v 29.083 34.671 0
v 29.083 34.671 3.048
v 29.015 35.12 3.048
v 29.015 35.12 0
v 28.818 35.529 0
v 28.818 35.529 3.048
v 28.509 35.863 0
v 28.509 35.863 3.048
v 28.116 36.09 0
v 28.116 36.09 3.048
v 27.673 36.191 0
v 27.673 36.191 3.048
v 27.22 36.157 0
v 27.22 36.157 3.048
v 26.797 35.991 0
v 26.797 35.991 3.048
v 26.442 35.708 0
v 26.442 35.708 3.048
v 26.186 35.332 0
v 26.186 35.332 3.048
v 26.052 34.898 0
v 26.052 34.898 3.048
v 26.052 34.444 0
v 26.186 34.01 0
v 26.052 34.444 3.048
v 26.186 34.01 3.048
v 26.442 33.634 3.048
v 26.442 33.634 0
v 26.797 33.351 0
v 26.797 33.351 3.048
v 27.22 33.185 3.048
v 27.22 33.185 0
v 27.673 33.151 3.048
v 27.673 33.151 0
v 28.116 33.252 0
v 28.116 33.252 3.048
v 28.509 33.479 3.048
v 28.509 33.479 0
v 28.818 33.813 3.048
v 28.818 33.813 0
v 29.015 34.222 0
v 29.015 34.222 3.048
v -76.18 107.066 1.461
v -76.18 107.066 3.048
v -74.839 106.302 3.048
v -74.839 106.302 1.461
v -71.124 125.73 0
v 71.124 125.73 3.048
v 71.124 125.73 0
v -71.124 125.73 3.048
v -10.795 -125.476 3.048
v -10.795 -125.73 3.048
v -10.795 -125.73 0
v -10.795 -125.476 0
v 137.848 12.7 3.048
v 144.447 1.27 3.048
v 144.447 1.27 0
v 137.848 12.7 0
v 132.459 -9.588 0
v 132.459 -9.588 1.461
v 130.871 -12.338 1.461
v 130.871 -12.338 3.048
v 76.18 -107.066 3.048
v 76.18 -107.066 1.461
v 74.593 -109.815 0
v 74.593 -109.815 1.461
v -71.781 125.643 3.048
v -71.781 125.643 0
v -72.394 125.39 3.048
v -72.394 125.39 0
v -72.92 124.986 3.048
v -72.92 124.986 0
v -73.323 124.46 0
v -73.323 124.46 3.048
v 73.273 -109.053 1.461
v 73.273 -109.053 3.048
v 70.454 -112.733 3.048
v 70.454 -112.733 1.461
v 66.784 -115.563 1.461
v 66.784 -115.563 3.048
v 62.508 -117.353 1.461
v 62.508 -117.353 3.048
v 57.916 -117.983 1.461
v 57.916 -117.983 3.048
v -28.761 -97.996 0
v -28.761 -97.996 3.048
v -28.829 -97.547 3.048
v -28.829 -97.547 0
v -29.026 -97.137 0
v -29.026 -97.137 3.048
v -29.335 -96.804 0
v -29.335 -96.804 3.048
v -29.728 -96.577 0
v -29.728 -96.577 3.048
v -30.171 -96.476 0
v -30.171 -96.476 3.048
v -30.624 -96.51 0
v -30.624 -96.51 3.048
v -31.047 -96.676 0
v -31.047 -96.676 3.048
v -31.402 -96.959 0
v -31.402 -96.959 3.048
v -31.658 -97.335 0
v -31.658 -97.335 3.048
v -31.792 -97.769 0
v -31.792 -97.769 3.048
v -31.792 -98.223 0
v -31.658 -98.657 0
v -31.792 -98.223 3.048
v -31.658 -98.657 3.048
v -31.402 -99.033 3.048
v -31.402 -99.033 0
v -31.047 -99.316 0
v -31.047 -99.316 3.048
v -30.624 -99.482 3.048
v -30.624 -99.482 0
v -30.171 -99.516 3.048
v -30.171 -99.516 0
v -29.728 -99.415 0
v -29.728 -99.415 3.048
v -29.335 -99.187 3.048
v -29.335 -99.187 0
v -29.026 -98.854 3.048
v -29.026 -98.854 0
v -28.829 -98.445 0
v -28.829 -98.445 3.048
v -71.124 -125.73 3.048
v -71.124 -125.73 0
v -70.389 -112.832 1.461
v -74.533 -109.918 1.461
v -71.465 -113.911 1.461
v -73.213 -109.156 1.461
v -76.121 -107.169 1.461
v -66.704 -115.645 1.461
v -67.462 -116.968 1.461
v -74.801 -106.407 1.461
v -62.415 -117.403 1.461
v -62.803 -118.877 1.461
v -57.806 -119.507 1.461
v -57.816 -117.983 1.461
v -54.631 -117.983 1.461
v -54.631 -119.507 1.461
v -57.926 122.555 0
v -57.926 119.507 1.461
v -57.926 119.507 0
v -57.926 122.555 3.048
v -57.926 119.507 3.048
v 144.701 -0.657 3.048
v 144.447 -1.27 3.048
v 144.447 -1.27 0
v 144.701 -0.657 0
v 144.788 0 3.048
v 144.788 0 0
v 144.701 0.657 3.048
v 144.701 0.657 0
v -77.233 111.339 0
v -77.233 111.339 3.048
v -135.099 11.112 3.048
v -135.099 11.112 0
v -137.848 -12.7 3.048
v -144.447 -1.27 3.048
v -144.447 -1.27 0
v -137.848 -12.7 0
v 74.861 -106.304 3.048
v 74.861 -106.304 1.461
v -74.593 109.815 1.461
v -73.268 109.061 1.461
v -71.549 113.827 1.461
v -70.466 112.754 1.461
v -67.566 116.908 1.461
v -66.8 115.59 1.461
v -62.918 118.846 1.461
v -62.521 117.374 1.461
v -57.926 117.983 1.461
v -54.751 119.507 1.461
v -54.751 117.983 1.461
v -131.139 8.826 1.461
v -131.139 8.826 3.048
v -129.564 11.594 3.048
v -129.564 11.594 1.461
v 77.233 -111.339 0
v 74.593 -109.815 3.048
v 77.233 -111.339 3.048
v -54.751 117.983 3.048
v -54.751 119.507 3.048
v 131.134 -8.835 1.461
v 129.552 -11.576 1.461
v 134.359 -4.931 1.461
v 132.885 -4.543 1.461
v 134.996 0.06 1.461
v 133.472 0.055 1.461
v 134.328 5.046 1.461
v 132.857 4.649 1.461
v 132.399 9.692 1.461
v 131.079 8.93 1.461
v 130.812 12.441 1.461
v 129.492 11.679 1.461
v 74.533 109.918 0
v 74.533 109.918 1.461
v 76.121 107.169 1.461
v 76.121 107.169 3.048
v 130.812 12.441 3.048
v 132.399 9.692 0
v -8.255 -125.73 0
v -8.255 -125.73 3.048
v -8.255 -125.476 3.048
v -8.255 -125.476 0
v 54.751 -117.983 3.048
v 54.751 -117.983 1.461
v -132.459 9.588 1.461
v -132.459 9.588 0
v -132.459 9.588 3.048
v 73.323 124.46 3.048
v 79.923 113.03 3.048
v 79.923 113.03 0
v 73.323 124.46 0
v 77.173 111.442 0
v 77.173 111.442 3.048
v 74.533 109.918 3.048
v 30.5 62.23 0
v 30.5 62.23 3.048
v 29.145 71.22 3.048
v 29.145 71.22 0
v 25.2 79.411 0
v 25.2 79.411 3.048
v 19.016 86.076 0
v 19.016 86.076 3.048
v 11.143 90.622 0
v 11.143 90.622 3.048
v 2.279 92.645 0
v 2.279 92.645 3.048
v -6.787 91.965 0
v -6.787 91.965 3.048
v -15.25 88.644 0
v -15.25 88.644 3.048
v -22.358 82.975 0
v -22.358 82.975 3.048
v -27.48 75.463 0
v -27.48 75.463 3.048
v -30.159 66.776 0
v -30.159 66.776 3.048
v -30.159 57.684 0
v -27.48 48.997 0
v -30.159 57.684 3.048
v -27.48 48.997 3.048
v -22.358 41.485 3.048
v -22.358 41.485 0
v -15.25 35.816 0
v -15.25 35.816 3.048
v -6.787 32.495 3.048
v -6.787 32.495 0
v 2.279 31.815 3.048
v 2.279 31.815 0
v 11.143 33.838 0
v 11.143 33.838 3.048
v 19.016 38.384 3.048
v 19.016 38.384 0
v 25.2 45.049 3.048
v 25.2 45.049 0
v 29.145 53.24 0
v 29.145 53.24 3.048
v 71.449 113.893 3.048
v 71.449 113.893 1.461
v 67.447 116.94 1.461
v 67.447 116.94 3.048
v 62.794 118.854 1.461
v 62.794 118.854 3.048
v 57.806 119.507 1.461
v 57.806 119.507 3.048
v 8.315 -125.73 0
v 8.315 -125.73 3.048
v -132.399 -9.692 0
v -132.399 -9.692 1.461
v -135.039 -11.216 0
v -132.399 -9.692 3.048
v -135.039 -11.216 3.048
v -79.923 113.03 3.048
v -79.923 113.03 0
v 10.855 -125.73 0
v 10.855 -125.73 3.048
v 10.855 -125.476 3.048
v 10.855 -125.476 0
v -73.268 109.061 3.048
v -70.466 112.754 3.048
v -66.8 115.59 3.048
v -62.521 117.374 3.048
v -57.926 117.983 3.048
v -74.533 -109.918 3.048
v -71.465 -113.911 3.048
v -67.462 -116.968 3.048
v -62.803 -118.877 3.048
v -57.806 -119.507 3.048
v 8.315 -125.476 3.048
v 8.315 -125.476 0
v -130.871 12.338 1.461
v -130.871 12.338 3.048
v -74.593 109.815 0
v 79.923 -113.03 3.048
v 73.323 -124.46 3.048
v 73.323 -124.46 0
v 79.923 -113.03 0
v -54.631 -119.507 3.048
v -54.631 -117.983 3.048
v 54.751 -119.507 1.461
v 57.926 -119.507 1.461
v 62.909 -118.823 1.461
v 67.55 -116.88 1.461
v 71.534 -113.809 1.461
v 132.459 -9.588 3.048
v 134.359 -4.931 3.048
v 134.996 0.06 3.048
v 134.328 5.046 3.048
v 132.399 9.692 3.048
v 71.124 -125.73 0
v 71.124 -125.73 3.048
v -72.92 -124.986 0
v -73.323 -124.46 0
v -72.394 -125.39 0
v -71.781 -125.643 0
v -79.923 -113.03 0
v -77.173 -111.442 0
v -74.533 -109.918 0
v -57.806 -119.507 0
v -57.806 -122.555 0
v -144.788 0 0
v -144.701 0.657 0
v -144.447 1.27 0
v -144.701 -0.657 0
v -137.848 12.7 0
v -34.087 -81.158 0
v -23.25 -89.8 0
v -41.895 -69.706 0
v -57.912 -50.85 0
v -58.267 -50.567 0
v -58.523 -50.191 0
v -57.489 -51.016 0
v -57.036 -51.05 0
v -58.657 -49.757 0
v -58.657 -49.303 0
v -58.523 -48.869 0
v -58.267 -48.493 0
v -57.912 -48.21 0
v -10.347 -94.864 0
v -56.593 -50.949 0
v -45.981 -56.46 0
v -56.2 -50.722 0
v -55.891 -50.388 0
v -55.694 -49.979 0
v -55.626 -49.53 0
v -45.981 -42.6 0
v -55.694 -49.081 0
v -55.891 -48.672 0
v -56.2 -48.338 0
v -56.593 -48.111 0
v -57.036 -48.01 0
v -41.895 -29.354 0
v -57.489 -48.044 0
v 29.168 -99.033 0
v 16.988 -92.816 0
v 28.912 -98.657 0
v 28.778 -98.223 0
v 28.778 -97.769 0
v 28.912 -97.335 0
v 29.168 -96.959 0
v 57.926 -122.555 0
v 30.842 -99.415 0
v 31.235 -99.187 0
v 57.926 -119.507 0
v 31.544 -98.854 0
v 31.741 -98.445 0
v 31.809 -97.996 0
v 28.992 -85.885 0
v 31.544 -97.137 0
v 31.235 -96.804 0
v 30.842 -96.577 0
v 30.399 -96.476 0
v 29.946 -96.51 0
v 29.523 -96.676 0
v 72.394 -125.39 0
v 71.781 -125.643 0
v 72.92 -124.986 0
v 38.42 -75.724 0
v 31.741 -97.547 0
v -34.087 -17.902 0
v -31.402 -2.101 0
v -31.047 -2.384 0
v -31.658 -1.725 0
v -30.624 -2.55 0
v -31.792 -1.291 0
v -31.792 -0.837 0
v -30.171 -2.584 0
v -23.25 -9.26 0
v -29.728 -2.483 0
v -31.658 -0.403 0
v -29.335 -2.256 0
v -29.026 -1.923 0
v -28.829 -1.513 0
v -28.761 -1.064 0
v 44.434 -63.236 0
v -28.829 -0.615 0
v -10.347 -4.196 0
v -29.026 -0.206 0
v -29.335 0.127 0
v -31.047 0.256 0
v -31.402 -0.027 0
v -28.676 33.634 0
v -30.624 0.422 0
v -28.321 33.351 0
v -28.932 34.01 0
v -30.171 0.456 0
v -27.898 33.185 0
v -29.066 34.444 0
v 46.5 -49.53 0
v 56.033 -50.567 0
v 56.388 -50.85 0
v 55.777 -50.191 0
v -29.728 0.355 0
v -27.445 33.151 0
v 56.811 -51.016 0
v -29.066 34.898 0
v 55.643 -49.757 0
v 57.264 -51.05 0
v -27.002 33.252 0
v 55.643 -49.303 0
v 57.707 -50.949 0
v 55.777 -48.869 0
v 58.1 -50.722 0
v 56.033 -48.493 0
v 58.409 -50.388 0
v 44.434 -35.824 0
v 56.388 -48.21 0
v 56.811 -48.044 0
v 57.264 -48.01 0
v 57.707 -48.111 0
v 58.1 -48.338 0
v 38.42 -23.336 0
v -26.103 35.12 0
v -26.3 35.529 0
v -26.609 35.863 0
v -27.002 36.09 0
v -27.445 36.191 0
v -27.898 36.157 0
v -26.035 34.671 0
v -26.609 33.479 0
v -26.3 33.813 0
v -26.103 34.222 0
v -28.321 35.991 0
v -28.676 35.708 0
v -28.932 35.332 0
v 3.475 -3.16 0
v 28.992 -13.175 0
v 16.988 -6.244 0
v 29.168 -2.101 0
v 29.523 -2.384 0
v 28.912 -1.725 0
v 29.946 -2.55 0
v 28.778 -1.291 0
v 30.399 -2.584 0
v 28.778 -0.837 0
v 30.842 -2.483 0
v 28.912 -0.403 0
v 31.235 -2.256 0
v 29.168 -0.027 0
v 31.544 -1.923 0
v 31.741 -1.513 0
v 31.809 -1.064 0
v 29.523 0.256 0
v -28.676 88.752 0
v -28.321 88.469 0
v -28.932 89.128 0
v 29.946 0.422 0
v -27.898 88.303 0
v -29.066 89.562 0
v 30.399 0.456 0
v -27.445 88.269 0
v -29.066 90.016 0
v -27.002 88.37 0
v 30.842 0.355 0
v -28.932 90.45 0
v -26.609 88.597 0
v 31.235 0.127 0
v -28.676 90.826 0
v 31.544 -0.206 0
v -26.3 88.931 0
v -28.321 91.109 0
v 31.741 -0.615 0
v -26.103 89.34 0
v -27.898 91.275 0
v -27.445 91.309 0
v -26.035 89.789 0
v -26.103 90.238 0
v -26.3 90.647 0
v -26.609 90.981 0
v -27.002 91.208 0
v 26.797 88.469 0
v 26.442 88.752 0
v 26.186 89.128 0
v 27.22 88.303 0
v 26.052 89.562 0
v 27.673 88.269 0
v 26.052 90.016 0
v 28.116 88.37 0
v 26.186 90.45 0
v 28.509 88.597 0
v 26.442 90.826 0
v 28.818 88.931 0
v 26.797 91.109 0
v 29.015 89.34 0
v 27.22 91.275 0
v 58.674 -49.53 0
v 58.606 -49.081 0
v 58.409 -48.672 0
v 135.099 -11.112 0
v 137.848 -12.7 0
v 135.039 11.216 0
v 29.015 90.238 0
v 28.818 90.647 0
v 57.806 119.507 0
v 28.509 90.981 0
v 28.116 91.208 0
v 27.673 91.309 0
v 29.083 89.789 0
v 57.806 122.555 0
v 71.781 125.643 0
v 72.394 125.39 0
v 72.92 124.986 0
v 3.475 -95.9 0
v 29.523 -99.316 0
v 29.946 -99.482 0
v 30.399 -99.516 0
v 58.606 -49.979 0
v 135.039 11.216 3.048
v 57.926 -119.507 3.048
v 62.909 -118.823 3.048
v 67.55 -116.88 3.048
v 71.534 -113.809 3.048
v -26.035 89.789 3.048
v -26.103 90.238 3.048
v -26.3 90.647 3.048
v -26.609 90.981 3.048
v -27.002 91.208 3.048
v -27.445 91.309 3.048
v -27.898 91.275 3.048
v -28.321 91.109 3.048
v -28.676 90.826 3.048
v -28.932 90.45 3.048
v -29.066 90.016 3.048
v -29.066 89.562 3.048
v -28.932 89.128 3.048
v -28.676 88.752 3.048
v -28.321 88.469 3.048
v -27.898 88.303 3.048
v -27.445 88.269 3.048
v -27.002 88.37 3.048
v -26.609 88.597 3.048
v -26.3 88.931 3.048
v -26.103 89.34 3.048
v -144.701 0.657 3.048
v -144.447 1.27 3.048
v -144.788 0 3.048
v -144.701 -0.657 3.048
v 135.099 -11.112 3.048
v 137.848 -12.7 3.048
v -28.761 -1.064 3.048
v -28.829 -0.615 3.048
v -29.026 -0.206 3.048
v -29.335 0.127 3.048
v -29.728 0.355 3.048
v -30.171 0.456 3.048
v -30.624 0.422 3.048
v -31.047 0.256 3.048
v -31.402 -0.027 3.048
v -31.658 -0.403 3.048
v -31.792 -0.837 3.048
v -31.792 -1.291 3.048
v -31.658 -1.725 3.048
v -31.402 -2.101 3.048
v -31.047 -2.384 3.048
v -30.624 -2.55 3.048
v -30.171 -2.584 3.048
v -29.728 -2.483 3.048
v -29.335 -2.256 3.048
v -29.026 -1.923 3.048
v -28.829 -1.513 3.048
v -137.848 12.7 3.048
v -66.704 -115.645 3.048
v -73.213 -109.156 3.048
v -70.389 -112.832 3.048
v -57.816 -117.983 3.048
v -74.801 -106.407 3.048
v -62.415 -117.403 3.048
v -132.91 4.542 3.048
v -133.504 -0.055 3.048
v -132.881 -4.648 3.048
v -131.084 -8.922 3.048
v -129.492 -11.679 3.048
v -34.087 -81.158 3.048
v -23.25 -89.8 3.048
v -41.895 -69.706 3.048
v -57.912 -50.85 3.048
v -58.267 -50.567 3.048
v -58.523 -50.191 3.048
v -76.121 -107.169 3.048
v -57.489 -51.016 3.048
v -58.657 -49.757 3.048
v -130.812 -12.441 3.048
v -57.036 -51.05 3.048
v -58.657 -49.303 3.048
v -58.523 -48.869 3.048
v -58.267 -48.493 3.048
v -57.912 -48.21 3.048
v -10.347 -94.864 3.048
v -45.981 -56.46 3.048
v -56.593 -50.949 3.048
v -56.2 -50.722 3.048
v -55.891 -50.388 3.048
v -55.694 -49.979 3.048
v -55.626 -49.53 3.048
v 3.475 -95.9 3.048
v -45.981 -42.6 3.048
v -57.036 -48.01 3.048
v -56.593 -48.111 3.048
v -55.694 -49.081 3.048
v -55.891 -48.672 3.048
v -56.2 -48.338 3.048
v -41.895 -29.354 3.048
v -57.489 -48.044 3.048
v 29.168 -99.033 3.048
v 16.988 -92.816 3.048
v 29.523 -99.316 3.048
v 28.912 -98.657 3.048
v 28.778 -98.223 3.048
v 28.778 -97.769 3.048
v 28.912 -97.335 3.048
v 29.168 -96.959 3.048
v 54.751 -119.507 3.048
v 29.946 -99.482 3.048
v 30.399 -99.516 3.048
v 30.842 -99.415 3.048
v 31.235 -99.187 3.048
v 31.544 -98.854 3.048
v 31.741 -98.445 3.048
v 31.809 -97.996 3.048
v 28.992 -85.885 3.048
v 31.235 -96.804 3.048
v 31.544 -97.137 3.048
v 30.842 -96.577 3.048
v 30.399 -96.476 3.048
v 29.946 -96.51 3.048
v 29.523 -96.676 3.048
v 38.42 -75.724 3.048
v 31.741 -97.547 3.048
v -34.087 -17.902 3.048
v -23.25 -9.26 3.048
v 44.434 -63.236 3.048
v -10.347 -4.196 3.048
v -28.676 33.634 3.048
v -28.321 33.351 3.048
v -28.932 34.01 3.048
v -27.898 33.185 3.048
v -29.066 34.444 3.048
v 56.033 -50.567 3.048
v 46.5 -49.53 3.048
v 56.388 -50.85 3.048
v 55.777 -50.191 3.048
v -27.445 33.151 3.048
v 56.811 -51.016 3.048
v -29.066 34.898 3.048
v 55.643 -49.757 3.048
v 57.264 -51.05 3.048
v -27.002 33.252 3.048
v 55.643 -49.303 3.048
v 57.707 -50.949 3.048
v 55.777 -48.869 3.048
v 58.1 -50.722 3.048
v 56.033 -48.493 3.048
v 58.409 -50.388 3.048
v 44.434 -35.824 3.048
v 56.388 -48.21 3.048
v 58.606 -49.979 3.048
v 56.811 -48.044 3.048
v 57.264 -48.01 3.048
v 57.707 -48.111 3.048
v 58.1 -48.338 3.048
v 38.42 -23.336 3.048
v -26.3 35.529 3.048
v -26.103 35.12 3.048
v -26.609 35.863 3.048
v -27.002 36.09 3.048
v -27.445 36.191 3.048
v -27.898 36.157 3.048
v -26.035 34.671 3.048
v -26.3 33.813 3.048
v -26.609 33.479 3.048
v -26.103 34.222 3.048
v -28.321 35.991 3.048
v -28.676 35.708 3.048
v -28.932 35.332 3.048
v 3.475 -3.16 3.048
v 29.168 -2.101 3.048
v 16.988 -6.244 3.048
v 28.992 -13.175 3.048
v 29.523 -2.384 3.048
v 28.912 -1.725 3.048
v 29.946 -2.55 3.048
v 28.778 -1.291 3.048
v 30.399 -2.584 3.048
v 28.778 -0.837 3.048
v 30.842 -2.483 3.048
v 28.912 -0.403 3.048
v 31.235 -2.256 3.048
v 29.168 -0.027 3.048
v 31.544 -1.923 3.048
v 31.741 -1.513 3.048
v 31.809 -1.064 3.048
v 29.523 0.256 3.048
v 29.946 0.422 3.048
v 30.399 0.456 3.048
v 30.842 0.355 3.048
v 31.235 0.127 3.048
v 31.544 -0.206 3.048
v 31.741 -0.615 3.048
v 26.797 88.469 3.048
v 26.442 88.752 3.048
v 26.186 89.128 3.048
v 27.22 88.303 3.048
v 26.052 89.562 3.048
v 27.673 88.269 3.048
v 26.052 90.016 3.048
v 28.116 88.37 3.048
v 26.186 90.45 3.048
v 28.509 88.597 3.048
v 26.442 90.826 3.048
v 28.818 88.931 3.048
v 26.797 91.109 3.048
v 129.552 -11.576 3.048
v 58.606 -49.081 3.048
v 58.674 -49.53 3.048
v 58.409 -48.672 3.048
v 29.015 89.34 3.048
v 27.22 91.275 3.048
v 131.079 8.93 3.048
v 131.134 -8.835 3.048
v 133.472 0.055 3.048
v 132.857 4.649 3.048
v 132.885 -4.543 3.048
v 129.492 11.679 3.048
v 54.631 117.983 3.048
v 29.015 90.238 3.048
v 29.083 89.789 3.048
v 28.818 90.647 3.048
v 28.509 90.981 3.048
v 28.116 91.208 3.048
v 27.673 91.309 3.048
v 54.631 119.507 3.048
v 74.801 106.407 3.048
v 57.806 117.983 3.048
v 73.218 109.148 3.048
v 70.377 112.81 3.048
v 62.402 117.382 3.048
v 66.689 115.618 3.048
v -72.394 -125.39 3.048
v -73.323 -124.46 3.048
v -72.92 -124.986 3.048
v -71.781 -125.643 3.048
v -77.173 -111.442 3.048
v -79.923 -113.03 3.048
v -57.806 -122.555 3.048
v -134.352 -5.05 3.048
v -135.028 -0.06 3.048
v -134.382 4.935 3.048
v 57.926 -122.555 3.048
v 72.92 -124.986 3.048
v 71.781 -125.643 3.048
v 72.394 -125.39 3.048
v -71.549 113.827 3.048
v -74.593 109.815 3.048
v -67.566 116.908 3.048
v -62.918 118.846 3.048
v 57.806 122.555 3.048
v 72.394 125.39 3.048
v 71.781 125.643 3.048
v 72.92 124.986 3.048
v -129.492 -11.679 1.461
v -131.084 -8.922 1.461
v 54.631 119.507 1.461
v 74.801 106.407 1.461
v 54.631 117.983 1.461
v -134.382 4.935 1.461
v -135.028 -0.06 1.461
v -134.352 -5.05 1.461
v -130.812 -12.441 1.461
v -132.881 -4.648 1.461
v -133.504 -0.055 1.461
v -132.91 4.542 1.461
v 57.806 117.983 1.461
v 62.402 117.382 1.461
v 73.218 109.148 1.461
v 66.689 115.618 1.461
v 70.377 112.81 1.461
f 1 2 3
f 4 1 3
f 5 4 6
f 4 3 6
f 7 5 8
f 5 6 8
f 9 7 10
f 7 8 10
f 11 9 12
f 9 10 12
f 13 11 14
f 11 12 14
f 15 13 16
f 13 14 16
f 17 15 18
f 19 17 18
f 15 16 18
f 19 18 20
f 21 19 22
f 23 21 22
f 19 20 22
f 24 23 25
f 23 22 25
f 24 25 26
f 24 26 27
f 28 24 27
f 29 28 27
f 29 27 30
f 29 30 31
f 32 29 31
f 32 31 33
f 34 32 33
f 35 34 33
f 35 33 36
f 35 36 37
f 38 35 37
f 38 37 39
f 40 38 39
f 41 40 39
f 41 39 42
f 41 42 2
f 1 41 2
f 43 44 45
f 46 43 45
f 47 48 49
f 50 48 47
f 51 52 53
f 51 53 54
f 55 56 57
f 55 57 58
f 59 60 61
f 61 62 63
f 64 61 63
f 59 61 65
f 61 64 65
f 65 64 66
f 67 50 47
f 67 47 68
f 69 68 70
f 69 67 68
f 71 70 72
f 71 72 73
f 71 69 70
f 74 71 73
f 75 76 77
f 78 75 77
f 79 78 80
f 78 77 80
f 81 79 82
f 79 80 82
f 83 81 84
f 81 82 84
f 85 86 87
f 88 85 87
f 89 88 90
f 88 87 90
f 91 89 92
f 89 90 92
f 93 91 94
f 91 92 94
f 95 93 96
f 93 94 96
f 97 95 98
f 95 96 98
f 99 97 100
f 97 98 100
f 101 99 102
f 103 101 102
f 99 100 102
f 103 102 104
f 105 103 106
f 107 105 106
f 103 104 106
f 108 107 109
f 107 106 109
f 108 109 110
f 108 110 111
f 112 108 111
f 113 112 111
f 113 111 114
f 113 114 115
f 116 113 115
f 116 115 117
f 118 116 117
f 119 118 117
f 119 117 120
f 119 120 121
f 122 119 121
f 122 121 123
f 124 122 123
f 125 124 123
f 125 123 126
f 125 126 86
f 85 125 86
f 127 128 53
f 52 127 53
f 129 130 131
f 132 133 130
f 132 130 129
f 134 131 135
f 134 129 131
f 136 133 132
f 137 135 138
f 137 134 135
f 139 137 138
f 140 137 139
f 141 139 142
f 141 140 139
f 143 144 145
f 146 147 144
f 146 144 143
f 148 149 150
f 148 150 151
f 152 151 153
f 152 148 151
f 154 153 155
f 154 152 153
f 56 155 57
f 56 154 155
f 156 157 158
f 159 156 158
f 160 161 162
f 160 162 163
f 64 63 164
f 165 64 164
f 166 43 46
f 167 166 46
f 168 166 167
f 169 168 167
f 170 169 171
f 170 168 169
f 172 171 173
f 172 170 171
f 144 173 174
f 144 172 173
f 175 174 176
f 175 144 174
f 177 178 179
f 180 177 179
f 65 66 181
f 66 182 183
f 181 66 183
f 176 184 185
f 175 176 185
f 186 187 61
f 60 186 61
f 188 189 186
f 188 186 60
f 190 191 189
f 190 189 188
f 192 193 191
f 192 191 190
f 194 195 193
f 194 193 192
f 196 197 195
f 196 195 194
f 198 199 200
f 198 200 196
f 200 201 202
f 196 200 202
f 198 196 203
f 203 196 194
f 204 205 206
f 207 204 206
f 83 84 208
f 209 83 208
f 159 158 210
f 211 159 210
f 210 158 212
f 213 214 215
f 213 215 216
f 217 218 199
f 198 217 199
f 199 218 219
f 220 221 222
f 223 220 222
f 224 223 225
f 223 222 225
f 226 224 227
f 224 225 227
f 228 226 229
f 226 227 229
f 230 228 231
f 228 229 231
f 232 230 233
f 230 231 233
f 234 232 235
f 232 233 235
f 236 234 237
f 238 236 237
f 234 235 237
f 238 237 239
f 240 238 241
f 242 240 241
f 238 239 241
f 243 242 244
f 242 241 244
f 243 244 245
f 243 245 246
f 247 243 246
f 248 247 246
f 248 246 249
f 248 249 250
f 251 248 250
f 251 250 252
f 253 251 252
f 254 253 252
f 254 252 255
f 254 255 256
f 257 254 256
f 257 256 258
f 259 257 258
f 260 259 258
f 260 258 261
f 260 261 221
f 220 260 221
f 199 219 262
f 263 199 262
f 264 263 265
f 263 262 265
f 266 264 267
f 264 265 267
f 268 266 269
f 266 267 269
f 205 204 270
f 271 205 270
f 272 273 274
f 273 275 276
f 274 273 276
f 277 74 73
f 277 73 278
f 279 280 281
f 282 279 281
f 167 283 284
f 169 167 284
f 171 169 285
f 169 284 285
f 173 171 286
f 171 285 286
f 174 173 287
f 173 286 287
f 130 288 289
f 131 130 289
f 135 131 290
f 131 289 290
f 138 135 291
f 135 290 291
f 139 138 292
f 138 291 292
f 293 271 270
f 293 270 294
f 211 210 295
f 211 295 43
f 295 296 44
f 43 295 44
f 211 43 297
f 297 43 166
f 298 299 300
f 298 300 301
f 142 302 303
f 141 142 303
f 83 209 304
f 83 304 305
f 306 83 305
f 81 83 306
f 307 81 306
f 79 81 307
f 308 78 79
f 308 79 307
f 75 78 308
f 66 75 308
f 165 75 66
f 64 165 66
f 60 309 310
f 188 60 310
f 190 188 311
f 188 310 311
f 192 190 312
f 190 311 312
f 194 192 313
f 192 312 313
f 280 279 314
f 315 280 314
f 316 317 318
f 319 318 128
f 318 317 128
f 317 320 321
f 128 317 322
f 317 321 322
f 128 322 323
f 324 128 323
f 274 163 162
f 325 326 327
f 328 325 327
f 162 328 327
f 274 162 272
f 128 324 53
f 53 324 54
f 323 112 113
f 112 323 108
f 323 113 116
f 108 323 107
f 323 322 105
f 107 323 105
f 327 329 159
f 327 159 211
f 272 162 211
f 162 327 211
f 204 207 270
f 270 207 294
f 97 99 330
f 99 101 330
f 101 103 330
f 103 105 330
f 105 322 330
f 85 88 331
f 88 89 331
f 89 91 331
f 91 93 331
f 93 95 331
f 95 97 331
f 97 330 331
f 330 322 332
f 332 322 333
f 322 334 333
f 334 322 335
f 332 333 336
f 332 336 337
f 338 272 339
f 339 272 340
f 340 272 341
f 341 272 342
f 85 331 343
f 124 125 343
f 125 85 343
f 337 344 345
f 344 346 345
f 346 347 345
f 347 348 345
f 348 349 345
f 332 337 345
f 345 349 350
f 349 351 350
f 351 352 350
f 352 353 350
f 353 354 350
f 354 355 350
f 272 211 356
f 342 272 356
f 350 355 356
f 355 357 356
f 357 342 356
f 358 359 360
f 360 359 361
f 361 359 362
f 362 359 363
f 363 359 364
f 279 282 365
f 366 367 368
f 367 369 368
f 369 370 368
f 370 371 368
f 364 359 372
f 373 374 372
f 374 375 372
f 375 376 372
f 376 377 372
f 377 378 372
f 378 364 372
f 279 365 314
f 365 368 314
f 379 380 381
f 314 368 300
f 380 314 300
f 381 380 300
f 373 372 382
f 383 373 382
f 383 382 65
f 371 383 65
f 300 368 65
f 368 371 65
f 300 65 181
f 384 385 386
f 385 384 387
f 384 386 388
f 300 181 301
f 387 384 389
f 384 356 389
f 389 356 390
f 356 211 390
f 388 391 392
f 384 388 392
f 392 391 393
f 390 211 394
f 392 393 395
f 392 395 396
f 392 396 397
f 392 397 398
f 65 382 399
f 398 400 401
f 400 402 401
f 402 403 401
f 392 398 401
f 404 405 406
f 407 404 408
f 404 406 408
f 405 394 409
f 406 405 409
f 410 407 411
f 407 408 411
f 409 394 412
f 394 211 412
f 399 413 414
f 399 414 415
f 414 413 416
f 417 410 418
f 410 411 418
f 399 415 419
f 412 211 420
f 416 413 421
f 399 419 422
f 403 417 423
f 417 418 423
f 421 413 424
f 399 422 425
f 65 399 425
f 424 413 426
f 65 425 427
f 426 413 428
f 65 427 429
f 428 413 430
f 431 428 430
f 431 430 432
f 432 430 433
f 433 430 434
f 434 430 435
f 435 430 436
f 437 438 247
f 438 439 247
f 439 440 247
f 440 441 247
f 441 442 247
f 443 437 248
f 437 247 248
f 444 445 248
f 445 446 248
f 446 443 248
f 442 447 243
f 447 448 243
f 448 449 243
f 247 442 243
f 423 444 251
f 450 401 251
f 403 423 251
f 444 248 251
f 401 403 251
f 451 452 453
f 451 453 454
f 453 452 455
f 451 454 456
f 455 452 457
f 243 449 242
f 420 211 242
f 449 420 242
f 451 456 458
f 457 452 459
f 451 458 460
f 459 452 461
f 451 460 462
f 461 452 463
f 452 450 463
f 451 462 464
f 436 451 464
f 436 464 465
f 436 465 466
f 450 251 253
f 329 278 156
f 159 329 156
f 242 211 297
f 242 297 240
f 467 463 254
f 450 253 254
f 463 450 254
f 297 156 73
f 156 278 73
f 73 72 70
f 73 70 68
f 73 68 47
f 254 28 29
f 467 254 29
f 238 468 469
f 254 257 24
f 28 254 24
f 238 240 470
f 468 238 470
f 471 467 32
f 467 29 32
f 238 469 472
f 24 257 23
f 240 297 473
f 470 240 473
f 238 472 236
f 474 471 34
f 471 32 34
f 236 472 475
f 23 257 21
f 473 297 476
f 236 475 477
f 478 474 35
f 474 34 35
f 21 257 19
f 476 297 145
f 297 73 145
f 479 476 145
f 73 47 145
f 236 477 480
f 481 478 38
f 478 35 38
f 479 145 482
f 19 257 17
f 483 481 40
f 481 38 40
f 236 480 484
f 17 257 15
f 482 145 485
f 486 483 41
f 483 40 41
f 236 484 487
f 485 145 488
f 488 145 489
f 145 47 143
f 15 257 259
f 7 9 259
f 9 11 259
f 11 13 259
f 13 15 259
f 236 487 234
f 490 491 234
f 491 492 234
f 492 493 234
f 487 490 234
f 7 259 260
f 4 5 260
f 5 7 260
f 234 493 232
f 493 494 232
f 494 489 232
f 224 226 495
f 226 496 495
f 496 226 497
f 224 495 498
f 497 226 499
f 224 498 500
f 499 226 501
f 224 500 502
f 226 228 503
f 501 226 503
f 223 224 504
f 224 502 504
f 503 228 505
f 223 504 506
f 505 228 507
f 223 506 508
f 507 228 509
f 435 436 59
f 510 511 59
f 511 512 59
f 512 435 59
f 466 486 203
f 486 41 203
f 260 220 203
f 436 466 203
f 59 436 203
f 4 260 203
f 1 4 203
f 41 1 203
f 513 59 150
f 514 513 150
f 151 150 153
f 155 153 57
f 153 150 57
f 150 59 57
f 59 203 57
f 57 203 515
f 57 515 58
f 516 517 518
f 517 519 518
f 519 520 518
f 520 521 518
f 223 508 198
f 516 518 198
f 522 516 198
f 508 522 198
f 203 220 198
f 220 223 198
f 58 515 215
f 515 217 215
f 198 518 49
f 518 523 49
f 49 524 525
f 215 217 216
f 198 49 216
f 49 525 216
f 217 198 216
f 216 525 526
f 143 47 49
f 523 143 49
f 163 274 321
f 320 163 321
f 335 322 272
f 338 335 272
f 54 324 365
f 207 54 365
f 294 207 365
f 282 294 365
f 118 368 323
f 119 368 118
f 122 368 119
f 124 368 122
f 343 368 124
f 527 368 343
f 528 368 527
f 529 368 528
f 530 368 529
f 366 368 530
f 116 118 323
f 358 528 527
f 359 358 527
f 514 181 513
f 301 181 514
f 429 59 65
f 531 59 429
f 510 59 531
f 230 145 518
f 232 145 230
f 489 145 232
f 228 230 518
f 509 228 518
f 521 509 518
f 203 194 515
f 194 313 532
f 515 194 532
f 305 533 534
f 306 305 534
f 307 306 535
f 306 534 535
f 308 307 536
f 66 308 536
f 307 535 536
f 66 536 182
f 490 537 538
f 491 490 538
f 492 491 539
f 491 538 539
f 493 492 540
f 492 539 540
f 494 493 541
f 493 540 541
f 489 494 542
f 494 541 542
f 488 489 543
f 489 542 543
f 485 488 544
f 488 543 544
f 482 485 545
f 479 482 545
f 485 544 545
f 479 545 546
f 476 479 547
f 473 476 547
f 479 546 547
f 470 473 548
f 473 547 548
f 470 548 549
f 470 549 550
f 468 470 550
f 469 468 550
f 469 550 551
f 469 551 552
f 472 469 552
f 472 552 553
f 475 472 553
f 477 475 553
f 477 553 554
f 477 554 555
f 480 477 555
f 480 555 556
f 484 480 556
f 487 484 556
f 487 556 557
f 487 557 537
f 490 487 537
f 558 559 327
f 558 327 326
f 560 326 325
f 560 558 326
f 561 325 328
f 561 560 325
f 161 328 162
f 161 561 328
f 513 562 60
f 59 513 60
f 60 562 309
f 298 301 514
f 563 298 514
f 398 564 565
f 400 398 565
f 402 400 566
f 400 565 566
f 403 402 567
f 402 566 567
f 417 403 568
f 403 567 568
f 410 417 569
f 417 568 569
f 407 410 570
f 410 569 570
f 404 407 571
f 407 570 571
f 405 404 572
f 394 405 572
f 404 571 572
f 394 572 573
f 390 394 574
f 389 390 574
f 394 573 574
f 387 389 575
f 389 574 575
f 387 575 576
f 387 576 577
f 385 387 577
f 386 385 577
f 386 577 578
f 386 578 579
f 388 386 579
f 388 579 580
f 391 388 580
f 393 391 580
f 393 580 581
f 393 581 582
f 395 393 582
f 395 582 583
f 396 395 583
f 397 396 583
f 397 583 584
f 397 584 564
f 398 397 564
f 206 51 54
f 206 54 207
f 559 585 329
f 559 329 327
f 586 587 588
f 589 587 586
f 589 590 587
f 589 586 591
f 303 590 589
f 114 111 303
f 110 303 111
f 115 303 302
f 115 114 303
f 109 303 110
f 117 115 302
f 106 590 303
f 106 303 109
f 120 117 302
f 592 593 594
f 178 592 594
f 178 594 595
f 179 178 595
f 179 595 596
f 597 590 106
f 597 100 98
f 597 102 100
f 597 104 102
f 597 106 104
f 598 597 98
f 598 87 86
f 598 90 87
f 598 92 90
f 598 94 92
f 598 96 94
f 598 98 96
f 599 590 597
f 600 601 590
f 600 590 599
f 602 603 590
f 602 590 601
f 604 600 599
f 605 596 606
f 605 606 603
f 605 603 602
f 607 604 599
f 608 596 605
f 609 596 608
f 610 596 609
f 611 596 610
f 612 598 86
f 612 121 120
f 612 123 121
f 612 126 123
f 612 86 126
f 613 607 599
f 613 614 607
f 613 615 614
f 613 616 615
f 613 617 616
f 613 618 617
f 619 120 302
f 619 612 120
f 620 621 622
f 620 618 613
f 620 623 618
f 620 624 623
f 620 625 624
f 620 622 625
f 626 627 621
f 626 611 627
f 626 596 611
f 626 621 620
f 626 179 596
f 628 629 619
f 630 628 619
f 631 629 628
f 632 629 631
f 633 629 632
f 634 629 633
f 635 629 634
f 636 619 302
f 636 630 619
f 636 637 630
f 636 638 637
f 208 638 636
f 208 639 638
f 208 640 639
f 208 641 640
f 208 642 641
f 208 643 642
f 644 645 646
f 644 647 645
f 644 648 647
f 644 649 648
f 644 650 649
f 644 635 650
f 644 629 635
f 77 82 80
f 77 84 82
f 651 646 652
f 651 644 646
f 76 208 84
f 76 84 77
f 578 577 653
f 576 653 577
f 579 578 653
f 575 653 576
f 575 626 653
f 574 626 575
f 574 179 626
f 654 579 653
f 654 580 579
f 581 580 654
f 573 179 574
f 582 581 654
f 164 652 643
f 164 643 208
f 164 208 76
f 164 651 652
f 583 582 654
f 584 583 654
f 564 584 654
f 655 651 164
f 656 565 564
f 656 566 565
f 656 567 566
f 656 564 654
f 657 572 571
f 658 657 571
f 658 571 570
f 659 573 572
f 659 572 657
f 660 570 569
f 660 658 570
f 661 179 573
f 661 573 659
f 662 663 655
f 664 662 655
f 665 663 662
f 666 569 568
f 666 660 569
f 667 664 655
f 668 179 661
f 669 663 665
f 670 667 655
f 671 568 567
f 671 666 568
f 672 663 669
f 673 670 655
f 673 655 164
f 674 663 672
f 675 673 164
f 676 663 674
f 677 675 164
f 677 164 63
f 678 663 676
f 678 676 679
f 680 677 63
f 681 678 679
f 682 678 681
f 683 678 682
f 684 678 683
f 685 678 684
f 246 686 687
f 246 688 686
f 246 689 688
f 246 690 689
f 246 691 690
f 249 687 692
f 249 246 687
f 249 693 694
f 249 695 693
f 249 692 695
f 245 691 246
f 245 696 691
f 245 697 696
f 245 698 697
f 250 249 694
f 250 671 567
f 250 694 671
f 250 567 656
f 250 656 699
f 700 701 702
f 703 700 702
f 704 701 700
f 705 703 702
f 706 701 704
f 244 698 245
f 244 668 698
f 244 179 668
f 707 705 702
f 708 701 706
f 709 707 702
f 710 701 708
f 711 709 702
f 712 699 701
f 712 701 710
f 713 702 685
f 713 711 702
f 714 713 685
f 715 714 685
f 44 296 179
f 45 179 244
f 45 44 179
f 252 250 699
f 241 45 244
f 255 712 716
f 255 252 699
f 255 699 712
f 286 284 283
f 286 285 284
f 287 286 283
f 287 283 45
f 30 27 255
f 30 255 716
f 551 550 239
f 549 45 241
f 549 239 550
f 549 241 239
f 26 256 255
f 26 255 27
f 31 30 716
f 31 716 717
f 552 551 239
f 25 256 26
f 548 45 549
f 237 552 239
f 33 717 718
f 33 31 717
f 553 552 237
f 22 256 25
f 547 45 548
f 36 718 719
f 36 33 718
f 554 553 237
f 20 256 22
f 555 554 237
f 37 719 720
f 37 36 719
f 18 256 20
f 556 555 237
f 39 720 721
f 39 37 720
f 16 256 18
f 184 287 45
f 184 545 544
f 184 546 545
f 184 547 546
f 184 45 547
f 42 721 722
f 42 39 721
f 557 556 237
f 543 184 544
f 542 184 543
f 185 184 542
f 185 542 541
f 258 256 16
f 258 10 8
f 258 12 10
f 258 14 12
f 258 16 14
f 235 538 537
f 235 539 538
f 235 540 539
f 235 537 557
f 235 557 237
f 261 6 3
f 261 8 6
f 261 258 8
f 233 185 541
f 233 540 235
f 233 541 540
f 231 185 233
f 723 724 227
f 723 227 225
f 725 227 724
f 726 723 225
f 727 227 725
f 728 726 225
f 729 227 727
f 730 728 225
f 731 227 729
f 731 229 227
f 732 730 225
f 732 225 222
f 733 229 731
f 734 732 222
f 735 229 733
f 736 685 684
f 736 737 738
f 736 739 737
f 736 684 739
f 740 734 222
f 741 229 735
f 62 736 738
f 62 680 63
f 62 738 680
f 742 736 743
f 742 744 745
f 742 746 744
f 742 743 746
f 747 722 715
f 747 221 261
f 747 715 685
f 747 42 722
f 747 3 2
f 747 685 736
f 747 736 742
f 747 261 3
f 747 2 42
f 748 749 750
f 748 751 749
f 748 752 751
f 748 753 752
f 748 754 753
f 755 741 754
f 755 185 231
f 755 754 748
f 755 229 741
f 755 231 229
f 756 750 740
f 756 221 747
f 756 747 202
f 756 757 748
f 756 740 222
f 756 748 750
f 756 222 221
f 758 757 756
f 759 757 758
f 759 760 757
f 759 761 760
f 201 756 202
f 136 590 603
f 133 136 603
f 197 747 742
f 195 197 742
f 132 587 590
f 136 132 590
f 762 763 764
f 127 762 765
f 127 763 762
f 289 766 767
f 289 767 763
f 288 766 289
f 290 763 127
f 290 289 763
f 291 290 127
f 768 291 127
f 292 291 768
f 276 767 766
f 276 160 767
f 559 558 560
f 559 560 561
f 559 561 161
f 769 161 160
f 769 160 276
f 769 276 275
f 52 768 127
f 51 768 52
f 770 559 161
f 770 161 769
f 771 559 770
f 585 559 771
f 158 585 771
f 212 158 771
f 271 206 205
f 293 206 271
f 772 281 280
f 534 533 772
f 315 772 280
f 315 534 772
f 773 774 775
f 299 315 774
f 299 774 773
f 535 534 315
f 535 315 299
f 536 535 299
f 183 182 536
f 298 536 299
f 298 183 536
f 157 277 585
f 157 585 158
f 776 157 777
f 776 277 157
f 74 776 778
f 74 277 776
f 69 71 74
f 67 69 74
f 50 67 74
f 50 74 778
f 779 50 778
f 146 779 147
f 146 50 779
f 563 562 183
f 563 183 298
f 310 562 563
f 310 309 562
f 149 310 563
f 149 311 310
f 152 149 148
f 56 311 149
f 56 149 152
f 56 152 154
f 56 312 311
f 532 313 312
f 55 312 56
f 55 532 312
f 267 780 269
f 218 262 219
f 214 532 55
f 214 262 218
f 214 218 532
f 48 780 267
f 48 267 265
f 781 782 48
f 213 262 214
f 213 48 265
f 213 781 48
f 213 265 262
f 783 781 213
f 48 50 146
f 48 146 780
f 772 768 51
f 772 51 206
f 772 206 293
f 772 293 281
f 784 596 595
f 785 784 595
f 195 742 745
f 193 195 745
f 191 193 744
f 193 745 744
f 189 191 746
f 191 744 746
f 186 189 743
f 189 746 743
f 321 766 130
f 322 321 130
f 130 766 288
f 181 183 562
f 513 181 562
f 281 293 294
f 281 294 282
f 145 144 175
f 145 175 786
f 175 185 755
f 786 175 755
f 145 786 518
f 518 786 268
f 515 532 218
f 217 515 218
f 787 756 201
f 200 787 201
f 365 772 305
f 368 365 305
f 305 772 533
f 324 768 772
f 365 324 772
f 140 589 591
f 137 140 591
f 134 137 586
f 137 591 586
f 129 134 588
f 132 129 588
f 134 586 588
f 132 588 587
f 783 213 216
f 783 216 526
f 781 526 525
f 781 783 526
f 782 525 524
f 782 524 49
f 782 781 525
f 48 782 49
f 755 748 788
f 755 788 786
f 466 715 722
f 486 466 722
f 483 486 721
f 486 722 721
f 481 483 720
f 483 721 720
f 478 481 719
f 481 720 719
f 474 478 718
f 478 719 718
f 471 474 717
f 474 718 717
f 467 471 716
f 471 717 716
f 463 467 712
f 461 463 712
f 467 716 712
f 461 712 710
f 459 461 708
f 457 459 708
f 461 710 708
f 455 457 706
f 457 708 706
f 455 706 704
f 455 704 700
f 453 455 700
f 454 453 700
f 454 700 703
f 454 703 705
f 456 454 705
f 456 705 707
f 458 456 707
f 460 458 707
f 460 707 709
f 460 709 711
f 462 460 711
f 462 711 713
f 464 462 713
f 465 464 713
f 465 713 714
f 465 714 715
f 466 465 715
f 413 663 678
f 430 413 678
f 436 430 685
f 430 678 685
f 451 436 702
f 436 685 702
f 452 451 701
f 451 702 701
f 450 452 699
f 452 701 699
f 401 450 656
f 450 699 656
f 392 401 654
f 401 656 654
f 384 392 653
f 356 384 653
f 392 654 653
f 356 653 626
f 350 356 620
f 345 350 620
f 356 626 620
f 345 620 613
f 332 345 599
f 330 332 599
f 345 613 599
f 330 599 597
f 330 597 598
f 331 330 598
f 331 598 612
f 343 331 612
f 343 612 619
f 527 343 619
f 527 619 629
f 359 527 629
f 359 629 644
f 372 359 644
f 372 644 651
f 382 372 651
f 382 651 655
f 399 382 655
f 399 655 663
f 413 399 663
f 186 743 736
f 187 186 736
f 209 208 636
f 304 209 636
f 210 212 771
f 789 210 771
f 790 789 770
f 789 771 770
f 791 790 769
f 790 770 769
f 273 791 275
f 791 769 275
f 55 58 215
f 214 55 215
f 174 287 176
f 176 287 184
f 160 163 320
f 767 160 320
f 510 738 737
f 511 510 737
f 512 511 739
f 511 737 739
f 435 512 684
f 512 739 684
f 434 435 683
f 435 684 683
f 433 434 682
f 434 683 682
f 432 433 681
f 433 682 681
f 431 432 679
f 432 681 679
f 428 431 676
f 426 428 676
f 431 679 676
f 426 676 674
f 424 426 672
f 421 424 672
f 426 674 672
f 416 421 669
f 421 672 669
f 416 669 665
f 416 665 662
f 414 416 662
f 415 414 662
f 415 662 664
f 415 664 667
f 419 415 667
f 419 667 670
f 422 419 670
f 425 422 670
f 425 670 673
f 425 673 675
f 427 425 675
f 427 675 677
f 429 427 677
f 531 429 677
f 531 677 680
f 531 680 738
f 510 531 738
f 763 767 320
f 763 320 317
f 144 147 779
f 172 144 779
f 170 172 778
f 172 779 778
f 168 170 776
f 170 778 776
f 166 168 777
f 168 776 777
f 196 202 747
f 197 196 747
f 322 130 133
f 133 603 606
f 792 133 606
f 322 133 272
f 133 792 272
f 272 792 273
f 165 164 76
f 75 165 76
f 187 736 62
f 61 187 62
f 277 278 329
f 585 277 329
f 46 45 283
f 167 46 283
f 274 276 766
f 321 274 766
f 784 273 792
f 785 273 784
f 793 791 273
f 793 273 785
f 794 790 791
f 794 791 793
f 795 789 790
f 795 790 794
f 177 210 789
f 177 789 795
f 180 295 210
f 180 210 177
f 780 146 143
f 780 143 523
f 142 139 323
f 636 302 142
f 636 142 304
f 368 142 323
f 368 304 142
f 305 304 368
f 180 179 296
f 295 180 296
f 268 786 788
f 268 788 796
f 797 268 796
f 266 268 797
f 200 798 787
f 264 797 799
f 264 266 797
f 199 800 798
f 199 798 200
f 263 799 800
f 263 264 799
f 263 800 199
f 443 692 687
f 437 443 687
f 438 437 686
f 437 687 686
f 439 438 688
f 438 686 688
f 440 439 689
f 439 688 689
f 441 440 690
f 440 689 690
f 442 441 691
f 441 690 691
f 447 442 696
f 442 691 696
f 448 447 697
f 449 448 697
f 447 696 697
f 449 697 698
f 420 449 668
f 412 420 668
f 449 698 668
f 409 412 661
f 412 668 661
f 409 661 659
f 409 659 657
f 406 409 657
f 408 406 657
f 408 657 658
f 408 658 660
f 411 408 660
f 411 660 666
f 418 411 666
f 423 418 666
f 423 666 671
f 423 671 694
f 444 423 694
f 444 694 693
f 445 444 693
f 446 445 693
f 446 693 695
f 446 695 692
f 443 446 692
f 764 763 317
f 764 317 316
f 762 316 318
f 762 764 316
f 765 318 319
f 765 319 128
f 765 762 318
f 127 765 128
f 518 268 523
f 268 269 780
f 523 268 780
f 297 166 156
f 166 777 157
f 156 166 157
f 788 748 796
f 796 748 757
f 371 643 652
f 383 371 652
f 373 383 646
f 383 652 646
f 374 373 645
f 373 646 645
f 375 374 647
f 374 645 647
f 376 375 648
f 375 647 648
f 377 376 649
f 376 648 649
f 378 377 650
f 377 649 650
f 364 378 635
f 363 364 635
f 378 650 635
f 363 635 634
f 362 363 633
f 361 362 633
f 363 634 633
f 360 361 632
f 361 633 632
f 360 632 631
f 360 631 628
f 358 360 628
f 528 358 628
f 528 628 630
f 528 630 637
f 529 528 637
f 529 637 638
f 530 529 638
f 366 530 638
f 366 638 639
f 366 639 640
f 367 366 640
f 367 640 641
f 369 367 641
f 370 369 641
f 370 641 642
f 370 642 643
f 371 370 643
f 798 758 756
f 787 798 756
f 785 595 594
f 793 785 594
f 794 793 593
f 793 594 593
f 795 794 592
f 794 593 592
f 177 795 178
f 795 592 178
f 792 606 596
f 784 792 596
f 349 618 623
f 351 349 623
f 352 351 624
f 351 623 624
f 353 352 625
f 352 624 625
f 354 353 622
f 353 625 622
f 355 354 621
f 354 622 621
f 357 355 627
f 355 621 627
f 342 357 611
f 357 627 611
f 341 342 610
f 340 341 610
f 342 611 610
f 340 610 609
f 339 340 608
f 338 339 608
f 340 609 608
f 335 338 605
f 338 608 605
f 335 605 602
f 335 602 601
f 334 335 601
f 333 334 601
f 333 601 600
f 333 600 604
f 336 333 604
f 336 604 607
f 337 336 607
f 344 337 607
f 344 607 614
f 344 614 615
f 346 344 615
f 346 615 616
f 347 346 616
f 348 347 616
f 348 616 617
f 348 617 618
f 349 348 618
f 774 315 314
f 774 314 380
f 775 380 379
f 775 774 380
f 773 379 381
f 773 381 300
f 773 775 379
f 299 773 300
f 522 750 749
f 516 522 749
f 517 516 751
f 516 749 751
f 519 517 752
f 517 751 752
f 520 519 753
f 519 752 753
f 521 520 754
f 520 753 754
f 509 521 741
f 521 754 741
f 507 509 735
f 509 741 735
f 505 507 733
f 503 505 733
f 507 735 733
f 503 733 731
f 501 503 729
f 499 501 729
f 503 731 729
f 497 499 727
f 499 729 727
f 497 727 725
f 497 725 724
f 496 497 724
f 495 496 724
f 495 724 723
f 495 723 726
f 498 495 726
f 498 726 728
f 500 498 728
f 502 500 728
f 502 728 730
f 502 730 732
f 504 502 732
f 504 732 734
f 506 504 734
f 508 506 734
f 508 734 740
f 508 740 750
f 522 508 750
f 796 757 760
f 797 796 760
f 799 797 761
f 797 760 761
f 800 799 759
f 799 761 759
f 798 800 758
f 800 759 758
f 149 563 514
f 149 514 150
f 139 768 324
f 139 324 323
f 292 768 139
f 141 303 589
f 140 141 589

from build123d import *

# Parameters (mm, degrees)
F1_DEPTH  = 3.048
F2_R      = 30.5
F2_R_2    = 46.5
F2_R_3    = 1.524
F3_DEPTH  = 25.4
F4_W      = 115.7319251503
F4_H      = 3.048
F5_DEPTH  = 3.049
F7_W      = 2.54
F7_H      = 0.254
F8_DEPTH  = 3.049
F10_DEPTH = 3.048
F11_W     = 3.175
F11_H     = 1.524
F12_DEPTH = 1.5875


with BuildPart() as f1:
    # F0 (on Top) → F1 (new body)
    with BuildSketch(Plane.XY):
        with BuildLine():
            Line((-79.9225977639, 113.03), (-137.8481502717, 12.7))
            ThreePointArc((-137.8481502717, 12.7), (-141.2511050156, 0), (-137.8481502717, -12.7))
            Line((-137.8481502717, -12.7), (-79.9225977639, -113.03))
            ThreePointArc((-79.9225977639, -113.03), (-70.6255525078, -122.3270452561), (-57.9255525078, -125.73))
            Line((-57.9255525078, -125.73), (57.9255525078, -125.73))
            ThreePointArc((57.9255525078, -125.73), (70.6255525078, -122.3270452561), (79.9225977639, -113.03))
            Line((79.9225977639, -113.03), (137.8481502717, -12.7))
            ThreePointArc((137.8481502717, -12.7), (141.2511050156, 0), (137.8481502717, 12.7))
            Line((137.8481502717, 12.7), (79.9225977639, 113.03))
            ThreePointArc((79.9225977639, 113.03), (70.6255525078, 122.3270452561), (57.9255525078, 125.73))
            Line((57.9255525078, 125.73), (-57.9255525078, 125.73))
            ThreePointArc((-57.9255525078, 125.73), (-70.6255525078, 122.3270452561), (-79.9225977639, 113.03))
        make_face()
    extrude(amount=F1_DEPTH)

    # F2 (on face) → F3 (cut)
    with BuildSketch(Plane.XY.offset(3.048)):
        with Locations((0, 62.23)):
            Circle(F2_R)
        with Locations((0, -49.53)):
            Circle(F2_R_2)
        with Locations((57.15, -49.53)):
            Circle(F2_R_3)
        with Locations((30.2848859509, -1.0640513047)):
            Circle(F2_R_3)
        with Locations((30.2848859509, -97.9959486953)):
            Circle(F2_R_3)
        with Locations((-30.2848859509, -1.0640513047)):
            Circle(F2_R_3)
        with Locations((-30.2848859509, -97.9959486953)):
            Circle(F2_R_3)
        with Locations((-57.15, -49.53)):
            Circle(F2_R_3)
        with Locations((-27.559, 89.789)):
            Circle(F2_R_3)
        with Locations((-27.559, 34.671)):
            Circle(F2_R_3)
        with Locations((27.559, 34.671)):
            Circle(F2_R_3)
        with Locations((27.559, 89.789)):
            Circle(F2_R_3)
    extrude(amount=-F3_DEPTH, mode=Mode.SUBTRACT)

    # F4 (on face) → F5 (cut, through all)
    with BuildSketch(Plane.XY.offset(3.048)):
        Polygon((-135.0389296821, -11.215712791), (-77.1729671069, -111.4425), (-74.5333216761, -109.9185), (-132.3992842513, -9.6917127909), align=None)
        Polygon((-77.2325570395, 111.339287209), (-135.0985196147, 11.1125), (-132.4588741839, 9.5885), (-74.5929116088, 109.8152872091), align=None)
        with Locations((-0.0595899326, 121.031)):
            Rectangle(F4_W, F4_H)
        Polygon((135.0389296821, 11.215712791), (77.1729671069, 111.4425), (74.5333216761, 109.9185), (132.3992842513, 9.691712791), align=None)
        Polygon((77.2325570395, -111.339287209), (135.0985196147, -11.1125), (132.4588741839, -9.5885), (74.5929116088, -109.815287209), align=None)
        with Locations((0.0595899326, -121.031)):
            Rectangle(F4_W, F4_H)
    extrude(amount=-F5_DEPTH, mode=Mode.SUBTRACT)

    # F7 (on face) → F8 (cut, through all)
    with BuildSketch(Plane.XY.offset(3.048)):
        with Locations((-9.525, -125.603)):
            Rectangle(F7_W, F7_H)
        with Locations((9.5845899326, -125.603)):
            Rectangle(F7_W, F7_H)
    extrude(amount=-F8_DEPTH, mode=Mode.SUBTRACT)

    # F9 (on face) → F10 (join)
    with BuildSketch(Plane.XY.offset(3.048)):
        with BuildLine():
            Line((-73.3234841871, 124.46), (-79.9225977639, 113.03))
            Line((-79.9225977639, 113.03), (-57.9255525078, 125.73))
            Line((-57.9255525078, 125.73), (-71.1237796615, 125.73))
            ThreePointArc((-71.1237796615, 125.73), (-72.3937796615, 125.3897045256), (-73.3234841871, 124.46))
        make_face()
        with BuildLine():
            ThreePointArc((-137.8481502717, -12.7), (-141.2511050156, 0), (-137.8481502717, 12.7))
            Line((-137.8481502717, 12.7), (-144.4472638486, 1.27))
            ThreePointArc((-144.4472638486, 1.27), (-144.7875593229, 0), (-144.4472638486, -1.27))
            Line((-144.4472638486, -1.27), (-137.8481502717, -12.7))
        make_face()
        with BuildLine():
            ThreePointArc((-57.9255525078, -125.73), (-70.6255525078, -122.3270452561), (-79.9225977639, -113.03))
            Line((-79.9225977639, -113.03), (-73.3234841871, -124.46))
            ThreePointArc((-73.3234841871, -124.46), (-72.3937796615, -125.3897045256), (-71.1237796615, -125.73))
            Line((-71.1237796615, -125.73), (-57.9255525078, -125.73))
        make_face()
        with BuildLine():
            Line((73.3234841871, -124.46), (79.9225977639, -113.03))
            ThreePointArc((79.9225977639, -113.03), (70.6255525078, -122.3270452561), (57.9255525078, -125.73))
            Line((57.9255525078, -125.73), (71.1237796615, -125.73))
            ThreePointArc((71.1237796615, -125.73), (72.3937796615, -125.3897045256), (73.3234841871, -124.46))
        make_face()
        with BuildLine():
            Line((144.4472638486, 1.27), (137.8481502717, 12.7))
            ThreePointArc((137.8481502717, 12.7), (141.2511050156, 0), (137.8481502717, -12.7))
            Line((137.8481502717, -12.7), (144.4472638486, -1.27))
            ThreePointArc((144.4472638486, -1.27), (144.7875593229, 0), (144.4472638486, 1.27))
        make_face()
        with BuildLine():
            Line((71.1237796615, 125.73), (57.9255525078, 125.73))
            ThreePointArc((57.9255525078, 125.73), (70.6255525078, 122.3270452561), (79.9225977639, 113.03))
            Line((79.9225977639, 113.03), (73.3234841871, 124.46))
            ThreePointArc((73.3234841871, 124.46), (72.3937796615, 125.3897045256), (71.1237796615, 125.73))
        make_face()
    extrude(amount=-F10_DEPTH)

    # F11 (on face) → F12 (cut)
    with BuildSketch(Plane.XY.offset(3.048)):
        with BuildLine():
            Line((-57.9255525078, 117.983), (-57.9255525078, 119.507))
            ThreePointArc((-57.9255525078, 119.507), (-67.5657049473, 116.9079552121), (-74.5929116088, 109.8152872091))
            Line((-74.5929116088, 109.8152872091), (-73.2684038811, 109.0614601206))
            ThreePointArc((-73.2684038811, 109.0614601206), (-66.7996293906, 115.5904939256), (-57.9255525078, 117.983))
        make_face()
        with Locations((-56.3380525078, 118.745)):
            Rectangle(F11_W, F11_H)
        Polygon((-73.2684038811, 109.0614601206), (-74.5929116088, 109.8152872091), (-76.1804116088, 107.065656552), (-74.8388469782, 106.3021217395), align=None)
        with BuildLine():
            Line((73.2182344036, 109.1483562046), (74.5333216761, 109.9185))
            ThreePointArc((74.5333216761, 109.9185), (67.446525082, 116.9398894425), (57.8063726425, 119.507))
            Line((57.8063726425, 119.507), (57.8063726425, 117.983))
            ThreePointArc((57.8063726425, 117.983), (66.6886079177, 115.6177179059), (73.2182344036, 109.1483562046))
        make_face()
        Polygon((76.1208216761, 107.168869343), (74.5333216761, 109.9185), (73.2182344036, 109.1483562046), (74.801024176, 106.406883901), align=None)
        with Locations((56.2188726425, 118.745)):
            Rectangle(F11_W, F11_H)
        with BuildLine():
            Line((-131.1390514686, 8.8265), (-132.4588741839, 9.5885))
            ThreePointArc((-132.4588741839, 9.5885), (-135.0281115918, -0.0596393029), (-132.3992842513, -9.6917127909))
            Line((-132.3992842513, -9.6917127909), (-131.0841969788, -8.9215689955))
            ThreePointArc((-131.0841969788, -8.9215689955), (-133.5041188708, -0.0549290528), (-131.1390514686, 8.8265))
        make_face()
        Polygon((-130.8713741839, 12.338130657), (-132.4588741839, 9.5885), (-131.1390514686, 8.8265), (-129.563948664, 11.5940256944), align=None)
        Polygon((-131.0841969788, -8.9215689955), (-132.3992842513, -9.6917127909), (-130.8117842513, -12.4413434479), (-129.4919867512, -11.679358006), align=None)
        with BuildLine():
            Line((-73.2134989608, -109.1565), (-74.5333216761, -109.9185))
            ThreePointArc((-74.5333216761, -109.9185), (-67.4624066445, -116.9675945149), (-57.8063726425, -119.507))
            Line((-57.8063726425, -119.507), (-57.8157930976, -117.983029116))
            ThreePointArc((-57.8157930976, -117.983029116), (-66.7044894803, -115.6454229784), (-73.2134989608, -109.1565))
        make_face()
        Polygon((-76.1208216761, -107.1688693429), (-74.5333216761, -109.9185), (-73.2134989608, -109.1565), (-74.8009989608, -106.4068693429), align=None)
        Polygon((-57.8157930976, -117.983029116), (-57.8063726425, -119.507), (-54.6313726425, -119.507), (-54.6313726425, -117.983029116), align=None)
        with BuildLine():
            Line((57.9161320527, -117.983029116), (57.9255525078, -119.507))
            ThreePointArc((57.9255525078, -119.507), (67.5496524319, -116.8803488392), (74.5929116088, -109.815287209))
            Line((74.5929116088, -109.815287209), (73.2730888934, -109.053287209))
            ThreePointArc((73.2730888934, -109.053287209), (66.7835768752, -115.5628875527), (57.9161320527, -117.983029116))
        make_face()
        Polygon((54.7505525078, -119.507), (57.9255525078, -119.507), (57.9161320527, -117.983029116), (54.7505525078, -117.983029116), align=None)
        Polygon((73.2730888934, -109.053287209), (74.5929116088, -109.815287209), (76.1804116088, -107.065656552), (74.8605888934, -106.303656552), align=None)
        with BuildLine():
            Line((131.1343664563, -8.8346729115), (132.4588741839, -9.5885))
            ThreePointArc((132.4588741839, -9.5885), (134.9961775139, 0.0595406033), (132.3992842513, 9.691712791))
            Line((132.3992842513, 9.691712791), (131.0794615359, 8.929712791))
            ThreePointArc((131.0794615359, 8.929712791), (133.4721847929, 0.0548303532), (131.1343664563, -8.8346729115))
        make_face()
        Polygon((130.8713741839, -12.338130657), (132.4588741839, -9.5885), (131.1343664563, -8.8346729115), (129.5515766838, -11.576145215), align=None)
        Polygon((131.0794615359, 8.929712791), (132.3992842513, 9.691712791), (130.8117842513, 12.441343448), (129.4919615359, 11.679343448), align=None)
    extrude(amount=-F12_DEPTH, mode=Mode.SUBTRACT)


solid = f1.part
